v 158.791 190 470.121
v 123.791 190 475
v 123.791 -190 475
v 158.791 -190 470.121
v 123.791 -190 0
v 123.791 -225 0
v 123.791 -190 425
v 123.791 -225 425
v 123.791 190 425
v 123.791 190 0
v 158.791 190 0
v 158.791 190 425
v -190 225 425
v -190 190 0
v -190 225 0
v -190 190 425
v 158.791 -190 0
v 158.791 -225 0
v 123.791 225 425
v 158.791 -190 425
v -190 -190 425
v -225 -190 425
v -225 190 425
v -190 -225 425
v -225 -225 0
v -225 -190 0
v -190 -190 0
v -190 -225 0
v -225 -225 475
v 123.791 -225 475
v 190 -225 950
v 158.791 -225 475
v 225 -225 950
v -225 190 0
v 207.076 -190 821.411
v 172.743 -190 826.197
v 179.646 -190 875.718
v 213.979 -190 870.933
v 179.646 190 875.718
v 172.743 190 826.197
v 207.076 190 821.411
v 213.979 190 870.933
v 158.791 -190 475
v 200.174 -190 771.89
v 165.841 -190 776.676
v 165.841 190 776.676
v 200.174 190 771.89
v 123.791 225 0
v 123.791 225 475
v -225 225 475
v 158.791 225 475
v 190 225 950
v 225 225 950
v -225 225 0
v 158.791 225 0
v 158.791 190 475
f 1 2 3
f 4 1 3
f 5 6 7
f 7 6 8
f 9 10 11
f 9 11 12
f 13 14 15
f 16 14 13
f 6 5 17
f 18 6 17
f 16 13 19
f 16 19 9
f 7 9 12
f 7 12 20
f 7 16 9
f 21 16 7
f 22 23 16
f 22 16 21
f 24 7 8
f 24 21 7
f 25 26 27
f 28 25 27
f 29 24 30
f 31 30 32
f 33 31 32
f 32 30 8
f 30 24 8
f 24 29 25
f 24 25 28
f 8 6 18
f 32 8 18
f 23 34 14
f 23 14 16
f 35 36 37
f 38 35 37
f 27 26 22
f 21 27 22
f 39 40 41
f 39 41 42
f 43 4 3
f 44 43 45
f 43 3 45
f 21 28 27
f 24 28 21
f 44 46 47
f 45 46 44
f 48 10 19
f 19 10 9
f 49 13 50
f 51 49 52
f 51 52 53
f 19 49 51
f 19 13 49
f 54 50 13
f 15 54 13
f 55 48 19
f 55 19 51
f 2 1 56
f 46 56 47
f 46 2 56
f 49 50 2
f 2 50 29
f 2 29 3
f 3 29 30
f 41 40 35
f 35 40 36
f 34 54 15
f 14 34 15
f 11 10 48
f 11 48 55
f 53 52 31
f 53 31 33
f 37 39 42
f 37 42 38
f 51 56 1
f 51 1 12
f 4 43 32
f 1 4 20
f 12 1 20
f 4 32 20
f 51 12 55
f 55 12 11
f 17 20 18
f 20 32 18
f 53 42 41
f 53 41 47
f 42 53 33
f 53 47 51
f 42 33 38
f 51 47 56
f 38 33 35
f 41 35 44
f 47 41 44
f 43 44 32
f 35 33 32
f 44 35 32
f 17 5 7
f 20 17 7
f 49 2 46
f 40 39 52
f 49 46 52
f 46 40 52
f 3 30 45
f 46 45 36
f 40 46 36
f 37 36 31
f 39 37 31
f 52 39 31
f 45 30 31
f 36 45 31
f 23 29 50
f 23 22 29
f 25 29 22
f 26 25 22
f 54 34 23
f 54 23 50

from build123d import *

# Parameters (mm, degrees)
F0_W     = 450
F0_H     = 450
F1_DEPTH = 950
F2_W     = 66.2090092897
F2_H     = 425
F2_W_2   = 313.7909907103
F2_H_2   = 50
F3_DEPTH = 450.001
F4_W     = 380
F4_H     = 425
F5_DEPTH = 450.001
F6_W     = 380
F6_H     = 50
F6_H_2   = 304.5921526788
F7_DEPTH = 165.8159708686


with BuildPart() as f1:
    # F0 (on Top) → F1 (new body)
    with BuildSketch(Plane.XY):
        Rectangle(F0_W, F0_H)
    extrude(amount=F1_DEPTH)

    # F2 (on face) → F3 (cut, through all)
    with BuildSketch(Plane.XZ.offset(225)):
        Polygon((-225, 475), (123.7909907103, 475), (190, 950), (-225, 950), align=None)
        Polygon((158.7909907103, 475), (225, 475), (225, 950), align=None)
        with Locations((191.8954953551, 212.5)):
            Rectangle(F2_W, F2_H)
        with Locations((-33.1045046449, 212.5)):
            Rectangle(F2_W_2, F2_H)
        with Locations((191.8954953551, 450)):
            Rectangle(F2_W, F2_H_2)
    extrude(amount=-F3_DEPTH, mode=Mode.SUBTRACT)

    # F4 (on face) → F5 (cut, through all)
    with BuildSketch(Plane(origin=(-225, 0, 0), x_dir=(0, -1, 0), z_dir=(-1, 0, 0))):
        with Locations((0, 212.5)):
            Rectangle(F4_W, F4_H)
    extrude(amount=-F5_DEPTH, mode=Mode.SUBTRACT)

    # F6 (on face) → F7 (cut, through all)
    with BuildSketch(Plane(origin=(56.4845518778, 0, -7.8732341474), x_dir=(0, -1, 0), z_dir=(-0.9904248794, 0, 0.1380527369))):
        with Locations((0, 867.1336554909)):
            Rectangle(F6_W, F6_H)
        with Locations((0, 639.8375791515)):
            Rectangle(F6_W, F6_H_2)
    extrude(amount=-F7_DEPTH, mode=Mode.SUBTRACT)


solid = f1.part
